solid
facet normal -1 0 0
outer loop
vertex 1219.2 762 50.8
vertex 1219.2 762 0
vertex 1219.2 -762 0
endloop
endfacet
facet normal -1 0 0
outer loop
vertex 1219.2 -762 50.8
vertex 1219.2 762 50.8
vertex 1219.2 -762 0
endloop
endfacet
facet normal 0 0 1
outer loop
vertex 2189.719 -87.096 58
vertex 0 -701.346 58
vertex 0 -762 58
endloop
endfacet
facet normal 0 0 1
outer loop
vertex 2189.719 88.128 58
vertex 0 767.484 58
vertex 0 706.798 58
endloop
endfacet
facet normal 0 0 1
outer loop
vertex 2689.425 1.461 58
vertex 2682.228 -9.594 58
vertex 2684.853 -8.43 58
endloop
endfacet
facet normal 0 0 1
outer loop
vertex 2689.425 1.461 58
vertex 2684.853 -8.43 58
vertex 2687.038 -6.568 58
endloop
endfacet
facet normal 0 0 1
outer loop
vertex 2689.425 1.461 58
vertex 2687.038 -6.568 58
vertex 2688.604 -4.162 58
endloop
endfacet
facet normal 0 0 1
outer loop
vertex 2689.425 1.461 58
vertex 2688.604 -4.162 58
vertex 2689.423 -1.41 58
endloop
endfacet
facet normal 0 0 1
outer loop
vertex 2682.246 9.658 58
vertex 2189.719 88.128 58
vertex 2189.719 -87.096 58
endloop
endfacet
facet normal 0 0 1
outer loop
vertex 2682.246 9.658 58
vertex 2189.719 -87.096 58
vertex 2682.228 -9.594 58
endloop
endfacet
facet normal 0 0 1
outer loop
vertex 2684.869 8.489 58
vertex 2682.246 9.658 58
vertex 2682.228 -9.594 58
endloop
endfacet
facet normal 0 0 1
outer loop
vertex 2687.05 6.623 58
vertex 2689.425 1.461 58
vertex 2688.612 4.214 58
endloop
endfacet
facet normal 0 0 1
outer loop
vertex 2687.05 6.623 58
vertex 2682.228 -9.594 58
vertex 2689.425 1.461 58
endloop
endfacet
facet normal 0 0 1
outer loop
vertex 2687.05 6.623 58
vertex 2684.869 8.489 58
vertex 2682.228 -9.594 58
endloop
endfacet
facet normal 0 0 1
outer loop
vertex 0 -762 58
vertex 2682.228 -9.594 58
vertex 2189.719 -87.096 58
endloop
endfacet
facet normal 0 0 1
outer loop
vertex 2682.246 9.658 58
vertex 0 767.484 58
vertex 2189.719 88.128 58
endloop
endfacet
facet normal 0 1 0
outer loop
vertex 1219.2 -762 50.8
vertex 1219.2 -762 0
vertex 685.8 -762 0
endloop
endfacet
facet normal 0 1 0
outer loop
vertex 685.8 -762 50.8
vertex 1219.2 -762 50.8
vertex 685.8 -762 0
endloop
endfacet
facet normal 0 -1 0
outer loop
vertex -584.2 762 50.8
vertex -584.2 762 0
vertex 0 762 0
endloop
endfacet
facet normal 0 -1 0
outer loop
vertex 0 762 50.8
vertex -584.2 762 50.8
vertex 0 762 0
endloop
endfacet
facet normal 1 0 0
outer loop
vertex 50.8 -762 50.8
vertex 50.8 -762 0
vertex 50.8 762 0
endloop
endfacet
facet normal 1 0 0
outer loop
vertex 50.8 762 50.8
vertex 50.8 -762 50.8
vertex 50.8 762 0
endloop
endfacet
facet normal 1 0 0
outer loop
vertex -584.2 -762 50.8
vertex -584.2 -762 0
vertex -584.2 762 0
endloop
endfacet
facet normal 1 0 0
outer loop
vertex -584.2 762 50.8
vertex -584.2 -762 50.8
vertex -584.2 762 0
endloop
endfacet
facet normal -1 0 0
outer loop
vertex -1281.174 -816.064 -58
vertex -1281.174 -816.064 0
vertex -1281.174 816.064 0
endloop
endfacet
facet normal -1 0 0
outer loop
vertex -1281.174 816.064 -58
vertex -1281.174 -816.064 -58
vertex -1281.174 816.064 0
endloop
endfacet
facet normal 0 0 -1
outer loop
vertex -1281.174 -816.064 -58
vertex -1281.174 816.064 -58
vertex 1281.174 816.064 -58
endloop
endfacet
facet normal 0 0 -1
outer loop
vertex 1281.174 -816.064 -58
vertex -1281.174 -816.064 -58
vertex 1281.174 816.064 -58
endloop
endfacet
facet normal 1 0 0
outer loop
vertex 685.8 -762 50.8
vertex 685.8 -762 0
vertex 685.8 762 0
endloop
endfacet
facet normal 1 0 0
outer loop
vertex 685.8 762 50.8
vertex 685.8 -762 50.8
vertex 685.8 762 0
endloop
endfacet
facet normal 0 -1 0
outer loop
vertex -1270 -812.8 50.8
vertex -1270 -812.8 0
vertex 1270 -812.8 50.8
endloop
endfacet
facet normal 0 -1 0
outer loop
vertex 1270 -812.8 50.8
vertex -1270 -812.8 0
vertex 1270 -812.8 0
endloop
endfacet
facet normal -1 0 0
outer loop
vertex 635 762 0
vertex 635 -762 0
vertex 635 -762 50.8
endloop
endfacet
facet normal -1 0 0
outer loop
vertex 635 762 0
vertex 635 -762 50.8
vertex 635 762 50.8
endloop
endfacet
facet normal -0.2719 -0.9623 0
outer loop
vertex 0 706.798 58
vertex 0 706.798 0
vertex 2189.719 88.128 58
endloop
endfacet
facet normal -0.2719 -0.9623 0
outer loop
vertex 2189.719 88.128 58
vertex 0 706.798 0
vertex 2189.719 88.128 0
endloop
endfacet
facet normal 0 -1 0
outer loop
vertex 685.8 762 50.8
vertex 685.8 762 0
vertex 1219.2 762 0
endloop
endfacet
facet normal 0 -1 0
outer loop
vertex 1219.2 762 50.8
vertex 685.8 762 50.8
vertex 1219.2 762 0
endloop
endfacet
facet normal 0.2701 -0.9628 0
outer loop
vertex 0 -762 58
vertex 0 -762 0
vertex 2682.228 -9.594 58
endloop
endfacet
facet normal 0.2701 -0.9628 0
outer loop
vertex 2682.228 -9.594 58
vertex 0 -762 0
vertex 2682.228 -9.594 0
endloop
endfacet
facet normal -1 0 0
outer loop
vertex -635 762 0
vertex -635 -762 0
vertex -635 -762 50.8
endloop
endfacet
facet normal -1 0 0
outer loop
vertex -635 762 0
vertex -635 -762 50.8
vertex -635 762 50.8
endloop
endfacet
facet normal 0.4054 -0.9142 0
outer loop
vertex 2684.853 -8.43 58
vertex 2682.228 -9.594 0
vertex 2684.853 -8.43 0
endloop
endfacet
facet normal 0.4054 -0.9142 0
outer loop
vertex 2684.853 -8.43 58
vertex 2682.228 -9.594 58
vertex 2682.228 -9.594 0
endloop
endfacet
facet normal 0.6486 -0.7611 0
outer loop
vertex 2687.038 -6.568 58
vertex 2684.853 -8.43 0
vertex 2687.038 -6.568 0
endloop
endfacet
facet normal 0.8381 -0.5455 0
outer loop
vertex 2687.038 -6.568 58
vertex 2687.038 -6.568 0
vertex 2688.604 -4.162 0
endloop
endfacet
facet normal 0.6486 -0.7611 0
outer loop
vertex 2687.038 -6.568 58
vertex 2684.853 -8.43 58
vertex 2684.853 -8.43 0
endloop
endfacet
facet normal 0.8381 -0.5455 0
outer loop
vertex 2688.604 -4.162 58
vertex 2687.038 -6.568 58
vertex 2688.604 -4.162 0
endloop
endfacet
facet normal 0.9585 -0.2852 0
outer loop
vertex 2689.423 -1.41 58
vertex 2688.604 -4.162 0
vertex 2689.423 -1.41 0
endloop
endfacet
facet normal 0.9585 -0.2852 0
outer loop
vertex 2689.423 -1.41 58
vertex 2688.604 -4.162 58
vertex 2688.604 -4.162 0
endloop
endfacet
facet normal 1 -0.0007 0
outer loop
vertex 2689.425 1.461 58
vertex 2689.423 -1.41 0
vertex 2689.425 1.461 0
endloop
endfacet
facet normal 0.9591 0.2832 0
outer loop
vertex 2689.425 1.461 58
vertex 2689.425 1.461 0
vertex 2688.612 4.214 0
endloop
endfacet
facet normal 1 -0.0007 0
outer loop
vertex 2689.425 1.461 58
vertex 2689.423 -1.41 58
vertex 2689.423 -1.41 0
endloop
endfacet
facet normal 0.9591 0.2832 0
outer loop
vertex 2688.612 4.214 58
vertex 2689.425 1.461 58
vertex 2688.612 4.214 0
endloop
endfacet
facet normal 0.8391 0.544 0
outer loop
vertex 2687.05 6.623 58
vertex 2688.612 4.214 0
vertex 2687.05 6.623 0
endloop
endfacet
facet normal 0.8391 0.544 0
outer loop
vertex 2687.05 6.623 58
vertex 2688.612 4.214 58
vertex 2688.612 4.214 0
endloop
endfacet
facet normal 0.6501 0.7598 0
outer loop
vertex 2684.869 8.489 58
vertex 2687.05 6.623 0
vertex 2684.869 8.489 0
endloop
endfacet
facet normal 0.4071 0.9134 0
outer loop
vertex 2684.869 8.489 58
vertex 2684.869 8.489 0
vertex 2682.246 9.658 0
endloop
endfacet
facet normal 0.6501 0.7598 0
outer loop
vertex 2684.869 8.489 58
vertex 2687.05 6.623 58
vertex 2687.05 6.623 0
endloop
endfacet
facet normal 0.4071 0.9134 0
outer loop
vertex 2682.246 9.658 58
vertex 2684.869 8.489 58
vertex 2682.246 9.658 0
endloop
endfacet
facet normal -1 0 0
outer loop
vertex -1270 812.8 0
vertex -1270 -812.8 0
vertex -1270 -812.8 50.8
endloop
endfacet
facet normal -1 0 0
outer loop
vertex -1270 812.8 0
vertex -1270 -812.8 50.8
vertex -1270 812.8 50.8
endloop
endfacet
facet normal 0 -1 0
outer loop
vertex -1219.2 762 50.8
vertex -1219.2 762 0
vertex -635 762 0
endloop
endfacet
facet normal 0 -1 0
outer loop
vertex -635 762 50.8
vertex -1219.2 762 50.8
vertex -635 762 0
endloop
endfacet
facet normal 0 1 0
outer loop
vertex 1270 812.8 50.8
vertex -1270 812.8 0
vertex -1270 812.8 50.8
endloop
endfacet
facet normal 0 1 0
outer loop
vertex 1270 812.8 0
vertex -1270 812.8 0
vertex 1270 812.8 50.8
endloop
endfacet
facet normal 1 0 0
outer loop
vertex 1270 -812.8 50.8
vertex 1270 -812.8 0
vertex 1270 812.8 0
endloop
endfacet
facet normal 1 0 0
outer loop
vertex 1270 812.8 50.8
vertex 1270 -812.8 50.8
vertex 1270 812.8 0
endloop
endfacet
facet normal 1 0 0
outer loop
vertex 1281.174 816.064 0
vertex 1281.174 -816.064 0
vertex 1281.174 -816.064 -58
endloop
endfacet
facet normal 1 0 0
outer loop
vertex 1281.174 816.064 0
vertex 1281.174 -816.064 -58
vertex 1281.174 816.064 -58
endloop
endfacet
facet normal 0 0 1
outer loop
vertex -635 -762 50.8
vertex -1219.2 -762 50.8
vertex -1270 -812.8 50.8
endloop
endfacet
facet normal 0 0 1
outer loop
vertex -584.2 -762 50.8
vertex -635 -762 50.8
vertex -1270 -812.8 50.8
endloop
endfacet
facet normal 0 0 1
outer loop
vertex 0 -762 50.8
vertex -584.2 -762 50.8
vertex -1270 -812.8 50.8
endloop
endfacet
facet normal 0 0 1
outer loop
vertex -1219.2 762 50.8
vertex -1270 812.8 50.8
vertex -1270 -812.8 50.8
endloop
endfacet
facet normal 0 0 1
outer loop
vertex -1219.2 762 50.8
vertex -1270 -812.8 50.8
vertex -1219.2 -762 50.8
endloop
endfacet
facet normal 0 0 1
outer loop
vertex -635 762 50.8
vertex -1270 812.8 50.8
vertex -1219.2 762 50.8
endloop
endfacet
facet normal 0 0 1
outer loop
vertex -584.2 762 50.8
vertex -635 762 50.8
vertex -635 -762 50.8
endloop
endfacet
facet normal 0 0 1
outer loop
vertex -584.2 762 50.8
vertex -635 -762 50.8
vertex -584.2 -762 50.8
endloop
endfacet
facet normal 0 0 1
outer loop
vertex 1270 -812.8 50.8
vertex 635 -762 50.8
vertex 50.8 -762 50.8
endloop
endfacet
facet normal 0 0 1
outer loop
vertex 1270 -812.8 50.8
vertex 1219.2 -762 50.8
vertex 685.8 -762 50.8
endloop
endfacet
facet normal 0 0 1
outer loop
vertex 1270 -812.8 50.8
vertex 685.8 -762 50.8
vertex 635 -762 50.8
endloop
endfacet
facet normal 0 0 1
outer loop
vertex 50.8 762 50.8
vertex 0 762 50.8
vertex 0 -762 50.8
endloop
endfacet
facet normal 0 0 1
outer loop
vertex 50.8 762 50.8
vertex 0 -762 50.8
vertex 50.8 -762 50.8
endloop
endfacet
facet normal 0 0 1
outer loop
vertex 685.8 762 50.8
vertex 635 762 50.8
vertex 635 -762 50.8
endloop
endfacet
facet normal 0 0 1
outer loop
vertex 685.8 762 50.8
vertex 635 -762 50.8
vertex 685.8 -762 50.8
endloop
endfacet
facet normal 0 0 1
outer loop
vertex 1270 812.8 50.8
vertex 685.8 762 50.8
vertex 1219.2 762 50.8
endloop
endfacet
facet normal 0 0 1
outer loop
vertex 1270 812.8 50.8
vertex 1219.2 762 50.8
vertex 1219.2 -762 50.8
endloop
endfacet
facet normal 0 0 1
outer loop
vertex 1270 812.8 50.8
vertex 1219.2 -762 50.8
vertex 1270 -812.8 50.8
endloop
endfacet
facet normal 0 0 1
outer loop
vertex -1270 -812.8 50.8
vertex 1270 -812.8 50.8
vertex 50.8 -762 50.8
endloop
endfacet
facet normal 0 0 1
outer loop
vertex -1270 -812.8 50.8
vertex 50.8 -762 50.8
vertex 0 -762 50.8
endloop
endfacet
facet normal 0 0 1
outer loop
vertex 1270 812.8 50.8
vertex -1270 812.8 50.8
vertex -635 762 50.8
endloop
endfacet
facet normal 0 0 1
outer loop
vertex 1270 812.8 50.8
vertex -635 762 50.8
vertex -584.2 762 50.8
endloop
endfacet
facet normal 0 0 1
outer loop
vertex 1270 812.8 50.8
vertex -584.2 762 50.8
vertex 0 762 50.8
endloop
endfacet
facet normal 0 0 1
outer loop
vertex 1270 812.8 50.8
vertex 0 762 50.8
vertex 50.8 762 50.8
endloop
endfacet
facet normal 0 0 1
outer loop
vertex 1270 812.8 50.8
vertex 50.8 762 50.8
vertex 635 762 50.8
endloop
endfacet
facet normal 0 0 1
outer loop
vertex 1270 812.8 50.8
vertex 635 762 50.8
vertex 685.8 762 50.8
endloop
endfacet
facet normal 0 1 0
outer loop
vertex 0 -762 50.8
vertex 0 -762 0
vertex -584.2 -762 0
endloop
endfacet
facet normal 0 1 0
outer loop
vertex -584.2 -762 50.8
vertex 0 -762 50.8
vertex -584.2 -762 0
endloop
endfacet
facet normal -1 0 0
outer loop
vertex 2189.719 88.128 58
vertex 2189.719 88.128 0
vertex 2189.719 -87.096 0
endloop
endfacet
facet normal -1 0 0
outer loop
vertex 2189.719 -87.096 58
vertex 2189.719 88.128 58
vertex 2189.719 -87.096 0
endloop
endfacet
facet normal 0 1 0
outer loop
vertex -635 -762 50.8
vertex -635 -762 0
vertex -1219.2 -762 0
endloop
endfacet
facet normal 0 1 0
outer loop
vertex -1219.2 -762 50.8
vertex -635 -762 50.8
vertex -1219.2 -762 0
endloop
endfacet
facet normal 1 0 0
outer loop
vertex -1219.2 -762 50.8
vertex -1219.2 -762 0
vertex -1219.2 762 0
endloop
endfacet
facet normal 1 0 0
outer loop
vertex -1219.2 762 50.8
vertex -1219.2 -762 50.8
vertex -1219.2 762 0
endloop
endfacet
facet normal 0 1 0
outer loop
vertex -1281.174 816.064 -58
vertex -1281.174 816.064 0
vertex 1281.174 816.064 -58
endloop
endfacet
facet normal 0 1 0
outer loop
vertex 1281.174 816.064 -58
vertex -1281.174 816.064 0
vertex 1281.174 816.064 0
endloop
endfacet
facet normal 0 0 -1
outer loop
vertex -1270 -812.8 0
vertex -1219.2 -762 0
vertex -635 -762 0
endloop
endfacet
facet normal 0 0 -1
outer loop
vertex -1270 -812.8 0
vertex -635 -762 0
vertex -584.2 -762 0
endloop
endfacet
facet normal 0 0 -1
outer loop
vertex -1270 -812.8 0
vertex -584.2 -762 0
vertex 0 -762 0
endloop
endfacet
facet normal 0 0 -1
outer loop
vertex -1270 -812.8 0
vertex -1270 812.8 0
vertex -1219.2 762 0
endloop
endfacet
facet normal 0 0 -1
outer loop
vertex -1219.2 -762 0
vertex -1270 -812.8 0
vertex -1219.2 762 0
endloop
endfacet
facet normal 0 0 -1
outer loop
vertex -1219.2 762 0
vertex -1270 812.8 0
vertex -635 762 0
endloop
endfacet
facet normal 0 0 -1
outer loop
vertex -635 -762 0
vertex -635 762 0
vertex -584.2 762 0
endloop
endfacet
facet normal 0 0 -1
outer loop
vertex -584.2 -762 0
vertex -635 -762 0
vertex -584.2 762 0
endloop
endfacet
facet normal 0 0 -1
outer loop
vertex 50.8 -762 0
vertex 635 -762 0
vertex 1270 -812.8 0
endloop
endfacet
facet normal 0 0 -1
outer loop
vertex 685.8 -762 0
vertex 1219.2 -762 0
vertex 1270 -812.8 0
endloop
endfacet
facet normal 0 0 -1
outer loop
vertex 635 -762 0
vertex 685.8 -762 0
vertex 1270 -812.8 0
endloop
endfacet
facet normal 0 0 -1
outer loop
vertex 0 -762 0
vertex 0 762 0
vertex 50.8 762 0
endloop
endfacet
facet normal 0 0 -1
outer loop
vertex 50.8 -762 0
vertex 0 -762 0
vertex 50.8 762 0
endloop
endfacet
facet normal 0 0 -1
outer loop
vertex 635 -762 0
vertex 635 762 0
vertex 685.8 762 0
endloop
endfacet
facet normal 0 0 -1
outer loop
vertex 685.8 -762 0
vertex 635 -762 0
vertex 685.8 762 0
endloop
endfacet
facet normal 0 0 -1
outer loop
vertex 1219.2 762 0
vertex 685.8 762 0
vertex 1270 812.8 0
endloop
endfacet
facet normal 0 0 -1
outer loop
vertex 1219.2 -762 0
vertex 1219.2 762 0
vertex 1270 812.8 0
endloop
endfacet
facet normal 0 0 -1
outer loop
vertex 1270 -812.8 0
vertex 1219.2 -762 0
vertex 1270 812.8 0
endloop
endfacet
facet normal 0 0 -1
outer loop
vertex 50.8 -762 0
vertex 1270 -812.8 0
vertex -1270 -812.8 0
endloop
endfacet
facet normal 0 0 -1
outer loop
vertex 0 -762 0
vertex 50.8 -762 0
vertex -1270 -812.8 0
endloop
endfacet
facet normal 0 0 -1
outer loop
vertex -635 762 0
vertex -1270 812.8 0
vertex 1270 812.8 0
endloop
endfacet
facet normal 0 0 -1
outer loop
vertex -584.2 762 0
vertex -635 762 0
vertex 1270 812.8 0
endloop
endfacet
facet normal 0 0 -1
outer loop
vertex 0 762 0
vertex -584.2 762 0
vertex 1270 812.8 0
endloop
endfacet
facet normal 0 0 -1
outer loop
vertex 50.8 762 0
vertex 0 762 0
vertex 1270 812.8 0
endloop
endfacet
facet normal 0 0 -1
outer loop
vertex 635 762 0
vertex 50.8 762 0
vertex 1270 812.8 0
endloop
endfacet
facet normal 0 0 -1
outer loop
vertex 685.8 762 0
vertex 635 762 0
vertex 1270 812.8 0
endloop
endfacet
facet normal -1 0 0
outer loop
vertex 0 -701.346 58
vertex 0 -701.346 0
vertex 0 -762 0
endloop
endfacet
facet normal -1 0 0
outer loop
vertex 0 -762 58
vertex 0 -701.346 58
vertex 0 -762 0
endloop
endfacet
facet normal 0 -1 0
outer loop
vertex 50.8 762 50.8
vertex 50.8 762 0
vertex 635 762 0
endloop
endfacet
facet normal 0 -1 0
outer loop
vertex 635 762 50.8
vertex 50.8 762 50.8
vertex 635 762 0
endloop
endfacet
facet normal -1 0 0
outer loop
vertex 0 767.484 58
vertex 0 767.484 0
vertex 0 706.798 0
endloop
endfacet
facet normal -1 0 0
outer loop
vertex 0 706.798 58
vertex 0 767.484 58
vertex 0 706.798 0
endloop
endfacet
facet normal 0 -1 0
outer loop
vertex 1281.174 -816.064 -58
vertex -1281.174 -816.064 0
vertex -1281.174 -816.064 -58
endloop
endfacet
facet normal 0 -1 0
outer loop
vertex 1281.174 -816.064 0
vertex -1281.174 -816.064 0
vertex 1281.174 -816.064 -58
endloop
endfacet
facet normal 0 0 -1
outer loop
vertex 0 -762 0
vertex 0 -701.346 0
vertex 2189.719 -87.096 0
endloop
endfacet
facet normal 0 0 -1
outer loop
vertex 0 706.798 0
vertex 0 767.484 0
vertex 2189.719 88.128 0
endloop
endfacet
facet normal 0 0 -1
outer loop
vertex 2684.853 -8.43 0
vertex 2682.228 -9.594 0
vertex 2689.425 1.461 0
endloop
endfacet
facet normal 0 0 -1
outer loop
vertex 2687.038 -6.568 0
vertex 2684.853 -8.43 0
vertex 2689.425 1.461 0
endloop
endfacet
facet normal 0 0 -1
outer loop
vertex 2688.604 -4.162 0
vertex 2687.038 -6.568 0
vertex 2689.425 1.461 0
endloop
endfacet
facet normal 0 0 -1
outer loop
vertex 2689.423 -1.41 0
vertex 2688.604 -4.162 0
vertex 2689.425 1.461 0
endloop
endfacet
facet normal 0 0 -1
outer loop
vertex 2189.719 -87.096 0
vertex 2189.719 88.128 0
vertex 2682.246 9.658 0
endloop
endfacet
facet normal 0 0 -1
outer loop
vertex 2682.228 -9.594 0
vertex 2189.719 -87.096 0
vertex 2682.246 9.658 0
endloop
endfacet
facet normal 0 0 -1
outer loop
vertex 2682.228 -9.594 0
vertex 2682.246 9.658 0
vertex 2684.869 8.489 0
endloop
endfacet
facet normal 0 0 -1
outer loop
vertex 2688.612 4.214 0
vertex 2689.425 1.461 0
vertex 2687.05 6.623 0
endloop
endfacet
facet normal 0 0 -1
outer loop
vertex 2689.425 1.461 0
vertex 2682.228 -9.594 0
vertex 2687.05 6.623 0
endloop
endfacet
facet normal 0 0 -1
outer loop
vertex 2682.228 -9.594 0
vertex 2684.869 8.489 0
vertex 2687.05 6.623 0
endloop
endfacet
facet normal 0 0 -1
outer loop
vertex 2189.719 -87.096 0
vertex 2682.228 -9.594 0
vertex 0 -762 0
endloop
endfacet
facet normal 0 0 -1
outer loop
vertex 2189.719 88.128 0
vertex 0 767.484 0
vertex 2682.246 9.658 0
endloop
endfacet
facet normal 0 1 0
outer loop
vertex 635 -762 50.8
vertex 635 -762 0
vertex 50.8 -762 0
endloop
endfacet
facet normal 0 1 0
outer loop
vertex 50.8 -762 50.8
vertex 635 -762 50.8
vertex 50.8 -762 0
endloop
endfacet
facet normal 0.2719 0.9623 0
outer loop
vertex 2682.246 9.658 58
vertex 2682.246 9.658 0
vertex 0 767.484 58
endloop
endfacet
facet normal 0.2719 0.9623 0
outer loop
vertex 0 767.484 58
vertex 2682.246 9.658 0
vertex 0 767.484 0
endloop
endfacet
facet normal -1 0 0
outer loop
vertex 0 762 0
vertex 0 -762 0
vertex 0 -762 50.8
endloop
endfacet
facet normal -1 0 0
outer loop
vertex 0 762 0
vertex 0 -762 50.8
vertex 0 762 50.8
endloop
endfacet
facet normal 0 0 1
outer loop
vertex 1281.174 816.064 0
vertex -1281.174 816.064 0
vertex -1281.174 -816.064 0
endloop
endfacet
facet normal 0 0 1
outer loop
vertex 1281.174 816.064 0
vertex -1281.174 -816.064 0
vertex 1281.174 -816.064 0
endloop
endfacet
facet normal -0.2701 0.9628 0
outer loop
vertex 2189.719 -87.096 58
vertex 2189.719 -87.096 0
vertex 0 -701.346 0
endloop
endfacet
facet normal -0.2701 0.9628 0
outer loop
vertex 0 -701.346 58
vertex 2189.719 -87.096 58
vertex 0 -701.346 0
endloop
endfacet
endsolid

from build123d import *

# Parameters (mm, degrees)
F0_W     = 2540
F0_H     = 1625.6
F0_W_2   = 50.8
F0_H_2   = 1524
F1_DEPTH = 50.8
F3_DEPTH = 58
F4_R     = 10
F5_W     = 2562.348366
F5_H     = 1632.128954
F6_DEPTH = 58


with BuildPart() as f1:
    # F0 (on Top) → F1 (new body)
    with BuildSketch(Plane.XY):
        Rectangle(F0_W, F0_H)
        Polygon((1219.2, 762), (1219.2, -762), (685.8, -762), (635, -762), (50.8, -762), (0, -762), (-584.2, -762), (-635, -762), (-1219.2, -762), (-1219.2, 762), (-635, 762), (-584.2, 762), (0, 762), (50.8, 762), (635, 762), (685.8, 762), align=None, mode=Mode.SUBTRACT)
        with Locations((-609.6, 0)):
            Rectangle(F0_W_2, F0_H_2)
        with Locations((25.4, 0)):
            Rectangle(F0_W_2, F0_H_2)
        with Locations((660.4, 0)):
            Rectangle(F0_W_2, F0_H_2)
    extrude(amount=F1_DEPTH)


with BuildPart() as f3:
    # F2 (on Top) → F3 (new body)
    with BuildSketch(Plane.XY):
        Polygon((0, -762), (2716.429234, 0), (0, 767.48383), (0, 706.797673), (2189.718625, 88.127539), (2500.923512, 0.201553), (2189.718625, -87.096183), (0, -701.345791), align=None)
        Polygon((2189.718625, 88.127539), (2189.718625, -87.096183), (2500.923512, 0.201553), align=None)
    extrude(amount=F3_DEPTH)

    # F4
    f4_edges = [f3.edges().sort_by_distance(p)[0] for p in [
        (2716.429234, 0, 29),
    ]]
    fillet(f4_edges, radius=F4_R)


with BuildPart() as f6:
    # F5 (on Top) → F6 (new body)
    with BuildSketch(Plane.XY):
        Rectangle(F5_W, F5_H)
    extrude(amount=-F6_DEPTH)


solid = Compound([f1.part, f3.part, f6.part])
